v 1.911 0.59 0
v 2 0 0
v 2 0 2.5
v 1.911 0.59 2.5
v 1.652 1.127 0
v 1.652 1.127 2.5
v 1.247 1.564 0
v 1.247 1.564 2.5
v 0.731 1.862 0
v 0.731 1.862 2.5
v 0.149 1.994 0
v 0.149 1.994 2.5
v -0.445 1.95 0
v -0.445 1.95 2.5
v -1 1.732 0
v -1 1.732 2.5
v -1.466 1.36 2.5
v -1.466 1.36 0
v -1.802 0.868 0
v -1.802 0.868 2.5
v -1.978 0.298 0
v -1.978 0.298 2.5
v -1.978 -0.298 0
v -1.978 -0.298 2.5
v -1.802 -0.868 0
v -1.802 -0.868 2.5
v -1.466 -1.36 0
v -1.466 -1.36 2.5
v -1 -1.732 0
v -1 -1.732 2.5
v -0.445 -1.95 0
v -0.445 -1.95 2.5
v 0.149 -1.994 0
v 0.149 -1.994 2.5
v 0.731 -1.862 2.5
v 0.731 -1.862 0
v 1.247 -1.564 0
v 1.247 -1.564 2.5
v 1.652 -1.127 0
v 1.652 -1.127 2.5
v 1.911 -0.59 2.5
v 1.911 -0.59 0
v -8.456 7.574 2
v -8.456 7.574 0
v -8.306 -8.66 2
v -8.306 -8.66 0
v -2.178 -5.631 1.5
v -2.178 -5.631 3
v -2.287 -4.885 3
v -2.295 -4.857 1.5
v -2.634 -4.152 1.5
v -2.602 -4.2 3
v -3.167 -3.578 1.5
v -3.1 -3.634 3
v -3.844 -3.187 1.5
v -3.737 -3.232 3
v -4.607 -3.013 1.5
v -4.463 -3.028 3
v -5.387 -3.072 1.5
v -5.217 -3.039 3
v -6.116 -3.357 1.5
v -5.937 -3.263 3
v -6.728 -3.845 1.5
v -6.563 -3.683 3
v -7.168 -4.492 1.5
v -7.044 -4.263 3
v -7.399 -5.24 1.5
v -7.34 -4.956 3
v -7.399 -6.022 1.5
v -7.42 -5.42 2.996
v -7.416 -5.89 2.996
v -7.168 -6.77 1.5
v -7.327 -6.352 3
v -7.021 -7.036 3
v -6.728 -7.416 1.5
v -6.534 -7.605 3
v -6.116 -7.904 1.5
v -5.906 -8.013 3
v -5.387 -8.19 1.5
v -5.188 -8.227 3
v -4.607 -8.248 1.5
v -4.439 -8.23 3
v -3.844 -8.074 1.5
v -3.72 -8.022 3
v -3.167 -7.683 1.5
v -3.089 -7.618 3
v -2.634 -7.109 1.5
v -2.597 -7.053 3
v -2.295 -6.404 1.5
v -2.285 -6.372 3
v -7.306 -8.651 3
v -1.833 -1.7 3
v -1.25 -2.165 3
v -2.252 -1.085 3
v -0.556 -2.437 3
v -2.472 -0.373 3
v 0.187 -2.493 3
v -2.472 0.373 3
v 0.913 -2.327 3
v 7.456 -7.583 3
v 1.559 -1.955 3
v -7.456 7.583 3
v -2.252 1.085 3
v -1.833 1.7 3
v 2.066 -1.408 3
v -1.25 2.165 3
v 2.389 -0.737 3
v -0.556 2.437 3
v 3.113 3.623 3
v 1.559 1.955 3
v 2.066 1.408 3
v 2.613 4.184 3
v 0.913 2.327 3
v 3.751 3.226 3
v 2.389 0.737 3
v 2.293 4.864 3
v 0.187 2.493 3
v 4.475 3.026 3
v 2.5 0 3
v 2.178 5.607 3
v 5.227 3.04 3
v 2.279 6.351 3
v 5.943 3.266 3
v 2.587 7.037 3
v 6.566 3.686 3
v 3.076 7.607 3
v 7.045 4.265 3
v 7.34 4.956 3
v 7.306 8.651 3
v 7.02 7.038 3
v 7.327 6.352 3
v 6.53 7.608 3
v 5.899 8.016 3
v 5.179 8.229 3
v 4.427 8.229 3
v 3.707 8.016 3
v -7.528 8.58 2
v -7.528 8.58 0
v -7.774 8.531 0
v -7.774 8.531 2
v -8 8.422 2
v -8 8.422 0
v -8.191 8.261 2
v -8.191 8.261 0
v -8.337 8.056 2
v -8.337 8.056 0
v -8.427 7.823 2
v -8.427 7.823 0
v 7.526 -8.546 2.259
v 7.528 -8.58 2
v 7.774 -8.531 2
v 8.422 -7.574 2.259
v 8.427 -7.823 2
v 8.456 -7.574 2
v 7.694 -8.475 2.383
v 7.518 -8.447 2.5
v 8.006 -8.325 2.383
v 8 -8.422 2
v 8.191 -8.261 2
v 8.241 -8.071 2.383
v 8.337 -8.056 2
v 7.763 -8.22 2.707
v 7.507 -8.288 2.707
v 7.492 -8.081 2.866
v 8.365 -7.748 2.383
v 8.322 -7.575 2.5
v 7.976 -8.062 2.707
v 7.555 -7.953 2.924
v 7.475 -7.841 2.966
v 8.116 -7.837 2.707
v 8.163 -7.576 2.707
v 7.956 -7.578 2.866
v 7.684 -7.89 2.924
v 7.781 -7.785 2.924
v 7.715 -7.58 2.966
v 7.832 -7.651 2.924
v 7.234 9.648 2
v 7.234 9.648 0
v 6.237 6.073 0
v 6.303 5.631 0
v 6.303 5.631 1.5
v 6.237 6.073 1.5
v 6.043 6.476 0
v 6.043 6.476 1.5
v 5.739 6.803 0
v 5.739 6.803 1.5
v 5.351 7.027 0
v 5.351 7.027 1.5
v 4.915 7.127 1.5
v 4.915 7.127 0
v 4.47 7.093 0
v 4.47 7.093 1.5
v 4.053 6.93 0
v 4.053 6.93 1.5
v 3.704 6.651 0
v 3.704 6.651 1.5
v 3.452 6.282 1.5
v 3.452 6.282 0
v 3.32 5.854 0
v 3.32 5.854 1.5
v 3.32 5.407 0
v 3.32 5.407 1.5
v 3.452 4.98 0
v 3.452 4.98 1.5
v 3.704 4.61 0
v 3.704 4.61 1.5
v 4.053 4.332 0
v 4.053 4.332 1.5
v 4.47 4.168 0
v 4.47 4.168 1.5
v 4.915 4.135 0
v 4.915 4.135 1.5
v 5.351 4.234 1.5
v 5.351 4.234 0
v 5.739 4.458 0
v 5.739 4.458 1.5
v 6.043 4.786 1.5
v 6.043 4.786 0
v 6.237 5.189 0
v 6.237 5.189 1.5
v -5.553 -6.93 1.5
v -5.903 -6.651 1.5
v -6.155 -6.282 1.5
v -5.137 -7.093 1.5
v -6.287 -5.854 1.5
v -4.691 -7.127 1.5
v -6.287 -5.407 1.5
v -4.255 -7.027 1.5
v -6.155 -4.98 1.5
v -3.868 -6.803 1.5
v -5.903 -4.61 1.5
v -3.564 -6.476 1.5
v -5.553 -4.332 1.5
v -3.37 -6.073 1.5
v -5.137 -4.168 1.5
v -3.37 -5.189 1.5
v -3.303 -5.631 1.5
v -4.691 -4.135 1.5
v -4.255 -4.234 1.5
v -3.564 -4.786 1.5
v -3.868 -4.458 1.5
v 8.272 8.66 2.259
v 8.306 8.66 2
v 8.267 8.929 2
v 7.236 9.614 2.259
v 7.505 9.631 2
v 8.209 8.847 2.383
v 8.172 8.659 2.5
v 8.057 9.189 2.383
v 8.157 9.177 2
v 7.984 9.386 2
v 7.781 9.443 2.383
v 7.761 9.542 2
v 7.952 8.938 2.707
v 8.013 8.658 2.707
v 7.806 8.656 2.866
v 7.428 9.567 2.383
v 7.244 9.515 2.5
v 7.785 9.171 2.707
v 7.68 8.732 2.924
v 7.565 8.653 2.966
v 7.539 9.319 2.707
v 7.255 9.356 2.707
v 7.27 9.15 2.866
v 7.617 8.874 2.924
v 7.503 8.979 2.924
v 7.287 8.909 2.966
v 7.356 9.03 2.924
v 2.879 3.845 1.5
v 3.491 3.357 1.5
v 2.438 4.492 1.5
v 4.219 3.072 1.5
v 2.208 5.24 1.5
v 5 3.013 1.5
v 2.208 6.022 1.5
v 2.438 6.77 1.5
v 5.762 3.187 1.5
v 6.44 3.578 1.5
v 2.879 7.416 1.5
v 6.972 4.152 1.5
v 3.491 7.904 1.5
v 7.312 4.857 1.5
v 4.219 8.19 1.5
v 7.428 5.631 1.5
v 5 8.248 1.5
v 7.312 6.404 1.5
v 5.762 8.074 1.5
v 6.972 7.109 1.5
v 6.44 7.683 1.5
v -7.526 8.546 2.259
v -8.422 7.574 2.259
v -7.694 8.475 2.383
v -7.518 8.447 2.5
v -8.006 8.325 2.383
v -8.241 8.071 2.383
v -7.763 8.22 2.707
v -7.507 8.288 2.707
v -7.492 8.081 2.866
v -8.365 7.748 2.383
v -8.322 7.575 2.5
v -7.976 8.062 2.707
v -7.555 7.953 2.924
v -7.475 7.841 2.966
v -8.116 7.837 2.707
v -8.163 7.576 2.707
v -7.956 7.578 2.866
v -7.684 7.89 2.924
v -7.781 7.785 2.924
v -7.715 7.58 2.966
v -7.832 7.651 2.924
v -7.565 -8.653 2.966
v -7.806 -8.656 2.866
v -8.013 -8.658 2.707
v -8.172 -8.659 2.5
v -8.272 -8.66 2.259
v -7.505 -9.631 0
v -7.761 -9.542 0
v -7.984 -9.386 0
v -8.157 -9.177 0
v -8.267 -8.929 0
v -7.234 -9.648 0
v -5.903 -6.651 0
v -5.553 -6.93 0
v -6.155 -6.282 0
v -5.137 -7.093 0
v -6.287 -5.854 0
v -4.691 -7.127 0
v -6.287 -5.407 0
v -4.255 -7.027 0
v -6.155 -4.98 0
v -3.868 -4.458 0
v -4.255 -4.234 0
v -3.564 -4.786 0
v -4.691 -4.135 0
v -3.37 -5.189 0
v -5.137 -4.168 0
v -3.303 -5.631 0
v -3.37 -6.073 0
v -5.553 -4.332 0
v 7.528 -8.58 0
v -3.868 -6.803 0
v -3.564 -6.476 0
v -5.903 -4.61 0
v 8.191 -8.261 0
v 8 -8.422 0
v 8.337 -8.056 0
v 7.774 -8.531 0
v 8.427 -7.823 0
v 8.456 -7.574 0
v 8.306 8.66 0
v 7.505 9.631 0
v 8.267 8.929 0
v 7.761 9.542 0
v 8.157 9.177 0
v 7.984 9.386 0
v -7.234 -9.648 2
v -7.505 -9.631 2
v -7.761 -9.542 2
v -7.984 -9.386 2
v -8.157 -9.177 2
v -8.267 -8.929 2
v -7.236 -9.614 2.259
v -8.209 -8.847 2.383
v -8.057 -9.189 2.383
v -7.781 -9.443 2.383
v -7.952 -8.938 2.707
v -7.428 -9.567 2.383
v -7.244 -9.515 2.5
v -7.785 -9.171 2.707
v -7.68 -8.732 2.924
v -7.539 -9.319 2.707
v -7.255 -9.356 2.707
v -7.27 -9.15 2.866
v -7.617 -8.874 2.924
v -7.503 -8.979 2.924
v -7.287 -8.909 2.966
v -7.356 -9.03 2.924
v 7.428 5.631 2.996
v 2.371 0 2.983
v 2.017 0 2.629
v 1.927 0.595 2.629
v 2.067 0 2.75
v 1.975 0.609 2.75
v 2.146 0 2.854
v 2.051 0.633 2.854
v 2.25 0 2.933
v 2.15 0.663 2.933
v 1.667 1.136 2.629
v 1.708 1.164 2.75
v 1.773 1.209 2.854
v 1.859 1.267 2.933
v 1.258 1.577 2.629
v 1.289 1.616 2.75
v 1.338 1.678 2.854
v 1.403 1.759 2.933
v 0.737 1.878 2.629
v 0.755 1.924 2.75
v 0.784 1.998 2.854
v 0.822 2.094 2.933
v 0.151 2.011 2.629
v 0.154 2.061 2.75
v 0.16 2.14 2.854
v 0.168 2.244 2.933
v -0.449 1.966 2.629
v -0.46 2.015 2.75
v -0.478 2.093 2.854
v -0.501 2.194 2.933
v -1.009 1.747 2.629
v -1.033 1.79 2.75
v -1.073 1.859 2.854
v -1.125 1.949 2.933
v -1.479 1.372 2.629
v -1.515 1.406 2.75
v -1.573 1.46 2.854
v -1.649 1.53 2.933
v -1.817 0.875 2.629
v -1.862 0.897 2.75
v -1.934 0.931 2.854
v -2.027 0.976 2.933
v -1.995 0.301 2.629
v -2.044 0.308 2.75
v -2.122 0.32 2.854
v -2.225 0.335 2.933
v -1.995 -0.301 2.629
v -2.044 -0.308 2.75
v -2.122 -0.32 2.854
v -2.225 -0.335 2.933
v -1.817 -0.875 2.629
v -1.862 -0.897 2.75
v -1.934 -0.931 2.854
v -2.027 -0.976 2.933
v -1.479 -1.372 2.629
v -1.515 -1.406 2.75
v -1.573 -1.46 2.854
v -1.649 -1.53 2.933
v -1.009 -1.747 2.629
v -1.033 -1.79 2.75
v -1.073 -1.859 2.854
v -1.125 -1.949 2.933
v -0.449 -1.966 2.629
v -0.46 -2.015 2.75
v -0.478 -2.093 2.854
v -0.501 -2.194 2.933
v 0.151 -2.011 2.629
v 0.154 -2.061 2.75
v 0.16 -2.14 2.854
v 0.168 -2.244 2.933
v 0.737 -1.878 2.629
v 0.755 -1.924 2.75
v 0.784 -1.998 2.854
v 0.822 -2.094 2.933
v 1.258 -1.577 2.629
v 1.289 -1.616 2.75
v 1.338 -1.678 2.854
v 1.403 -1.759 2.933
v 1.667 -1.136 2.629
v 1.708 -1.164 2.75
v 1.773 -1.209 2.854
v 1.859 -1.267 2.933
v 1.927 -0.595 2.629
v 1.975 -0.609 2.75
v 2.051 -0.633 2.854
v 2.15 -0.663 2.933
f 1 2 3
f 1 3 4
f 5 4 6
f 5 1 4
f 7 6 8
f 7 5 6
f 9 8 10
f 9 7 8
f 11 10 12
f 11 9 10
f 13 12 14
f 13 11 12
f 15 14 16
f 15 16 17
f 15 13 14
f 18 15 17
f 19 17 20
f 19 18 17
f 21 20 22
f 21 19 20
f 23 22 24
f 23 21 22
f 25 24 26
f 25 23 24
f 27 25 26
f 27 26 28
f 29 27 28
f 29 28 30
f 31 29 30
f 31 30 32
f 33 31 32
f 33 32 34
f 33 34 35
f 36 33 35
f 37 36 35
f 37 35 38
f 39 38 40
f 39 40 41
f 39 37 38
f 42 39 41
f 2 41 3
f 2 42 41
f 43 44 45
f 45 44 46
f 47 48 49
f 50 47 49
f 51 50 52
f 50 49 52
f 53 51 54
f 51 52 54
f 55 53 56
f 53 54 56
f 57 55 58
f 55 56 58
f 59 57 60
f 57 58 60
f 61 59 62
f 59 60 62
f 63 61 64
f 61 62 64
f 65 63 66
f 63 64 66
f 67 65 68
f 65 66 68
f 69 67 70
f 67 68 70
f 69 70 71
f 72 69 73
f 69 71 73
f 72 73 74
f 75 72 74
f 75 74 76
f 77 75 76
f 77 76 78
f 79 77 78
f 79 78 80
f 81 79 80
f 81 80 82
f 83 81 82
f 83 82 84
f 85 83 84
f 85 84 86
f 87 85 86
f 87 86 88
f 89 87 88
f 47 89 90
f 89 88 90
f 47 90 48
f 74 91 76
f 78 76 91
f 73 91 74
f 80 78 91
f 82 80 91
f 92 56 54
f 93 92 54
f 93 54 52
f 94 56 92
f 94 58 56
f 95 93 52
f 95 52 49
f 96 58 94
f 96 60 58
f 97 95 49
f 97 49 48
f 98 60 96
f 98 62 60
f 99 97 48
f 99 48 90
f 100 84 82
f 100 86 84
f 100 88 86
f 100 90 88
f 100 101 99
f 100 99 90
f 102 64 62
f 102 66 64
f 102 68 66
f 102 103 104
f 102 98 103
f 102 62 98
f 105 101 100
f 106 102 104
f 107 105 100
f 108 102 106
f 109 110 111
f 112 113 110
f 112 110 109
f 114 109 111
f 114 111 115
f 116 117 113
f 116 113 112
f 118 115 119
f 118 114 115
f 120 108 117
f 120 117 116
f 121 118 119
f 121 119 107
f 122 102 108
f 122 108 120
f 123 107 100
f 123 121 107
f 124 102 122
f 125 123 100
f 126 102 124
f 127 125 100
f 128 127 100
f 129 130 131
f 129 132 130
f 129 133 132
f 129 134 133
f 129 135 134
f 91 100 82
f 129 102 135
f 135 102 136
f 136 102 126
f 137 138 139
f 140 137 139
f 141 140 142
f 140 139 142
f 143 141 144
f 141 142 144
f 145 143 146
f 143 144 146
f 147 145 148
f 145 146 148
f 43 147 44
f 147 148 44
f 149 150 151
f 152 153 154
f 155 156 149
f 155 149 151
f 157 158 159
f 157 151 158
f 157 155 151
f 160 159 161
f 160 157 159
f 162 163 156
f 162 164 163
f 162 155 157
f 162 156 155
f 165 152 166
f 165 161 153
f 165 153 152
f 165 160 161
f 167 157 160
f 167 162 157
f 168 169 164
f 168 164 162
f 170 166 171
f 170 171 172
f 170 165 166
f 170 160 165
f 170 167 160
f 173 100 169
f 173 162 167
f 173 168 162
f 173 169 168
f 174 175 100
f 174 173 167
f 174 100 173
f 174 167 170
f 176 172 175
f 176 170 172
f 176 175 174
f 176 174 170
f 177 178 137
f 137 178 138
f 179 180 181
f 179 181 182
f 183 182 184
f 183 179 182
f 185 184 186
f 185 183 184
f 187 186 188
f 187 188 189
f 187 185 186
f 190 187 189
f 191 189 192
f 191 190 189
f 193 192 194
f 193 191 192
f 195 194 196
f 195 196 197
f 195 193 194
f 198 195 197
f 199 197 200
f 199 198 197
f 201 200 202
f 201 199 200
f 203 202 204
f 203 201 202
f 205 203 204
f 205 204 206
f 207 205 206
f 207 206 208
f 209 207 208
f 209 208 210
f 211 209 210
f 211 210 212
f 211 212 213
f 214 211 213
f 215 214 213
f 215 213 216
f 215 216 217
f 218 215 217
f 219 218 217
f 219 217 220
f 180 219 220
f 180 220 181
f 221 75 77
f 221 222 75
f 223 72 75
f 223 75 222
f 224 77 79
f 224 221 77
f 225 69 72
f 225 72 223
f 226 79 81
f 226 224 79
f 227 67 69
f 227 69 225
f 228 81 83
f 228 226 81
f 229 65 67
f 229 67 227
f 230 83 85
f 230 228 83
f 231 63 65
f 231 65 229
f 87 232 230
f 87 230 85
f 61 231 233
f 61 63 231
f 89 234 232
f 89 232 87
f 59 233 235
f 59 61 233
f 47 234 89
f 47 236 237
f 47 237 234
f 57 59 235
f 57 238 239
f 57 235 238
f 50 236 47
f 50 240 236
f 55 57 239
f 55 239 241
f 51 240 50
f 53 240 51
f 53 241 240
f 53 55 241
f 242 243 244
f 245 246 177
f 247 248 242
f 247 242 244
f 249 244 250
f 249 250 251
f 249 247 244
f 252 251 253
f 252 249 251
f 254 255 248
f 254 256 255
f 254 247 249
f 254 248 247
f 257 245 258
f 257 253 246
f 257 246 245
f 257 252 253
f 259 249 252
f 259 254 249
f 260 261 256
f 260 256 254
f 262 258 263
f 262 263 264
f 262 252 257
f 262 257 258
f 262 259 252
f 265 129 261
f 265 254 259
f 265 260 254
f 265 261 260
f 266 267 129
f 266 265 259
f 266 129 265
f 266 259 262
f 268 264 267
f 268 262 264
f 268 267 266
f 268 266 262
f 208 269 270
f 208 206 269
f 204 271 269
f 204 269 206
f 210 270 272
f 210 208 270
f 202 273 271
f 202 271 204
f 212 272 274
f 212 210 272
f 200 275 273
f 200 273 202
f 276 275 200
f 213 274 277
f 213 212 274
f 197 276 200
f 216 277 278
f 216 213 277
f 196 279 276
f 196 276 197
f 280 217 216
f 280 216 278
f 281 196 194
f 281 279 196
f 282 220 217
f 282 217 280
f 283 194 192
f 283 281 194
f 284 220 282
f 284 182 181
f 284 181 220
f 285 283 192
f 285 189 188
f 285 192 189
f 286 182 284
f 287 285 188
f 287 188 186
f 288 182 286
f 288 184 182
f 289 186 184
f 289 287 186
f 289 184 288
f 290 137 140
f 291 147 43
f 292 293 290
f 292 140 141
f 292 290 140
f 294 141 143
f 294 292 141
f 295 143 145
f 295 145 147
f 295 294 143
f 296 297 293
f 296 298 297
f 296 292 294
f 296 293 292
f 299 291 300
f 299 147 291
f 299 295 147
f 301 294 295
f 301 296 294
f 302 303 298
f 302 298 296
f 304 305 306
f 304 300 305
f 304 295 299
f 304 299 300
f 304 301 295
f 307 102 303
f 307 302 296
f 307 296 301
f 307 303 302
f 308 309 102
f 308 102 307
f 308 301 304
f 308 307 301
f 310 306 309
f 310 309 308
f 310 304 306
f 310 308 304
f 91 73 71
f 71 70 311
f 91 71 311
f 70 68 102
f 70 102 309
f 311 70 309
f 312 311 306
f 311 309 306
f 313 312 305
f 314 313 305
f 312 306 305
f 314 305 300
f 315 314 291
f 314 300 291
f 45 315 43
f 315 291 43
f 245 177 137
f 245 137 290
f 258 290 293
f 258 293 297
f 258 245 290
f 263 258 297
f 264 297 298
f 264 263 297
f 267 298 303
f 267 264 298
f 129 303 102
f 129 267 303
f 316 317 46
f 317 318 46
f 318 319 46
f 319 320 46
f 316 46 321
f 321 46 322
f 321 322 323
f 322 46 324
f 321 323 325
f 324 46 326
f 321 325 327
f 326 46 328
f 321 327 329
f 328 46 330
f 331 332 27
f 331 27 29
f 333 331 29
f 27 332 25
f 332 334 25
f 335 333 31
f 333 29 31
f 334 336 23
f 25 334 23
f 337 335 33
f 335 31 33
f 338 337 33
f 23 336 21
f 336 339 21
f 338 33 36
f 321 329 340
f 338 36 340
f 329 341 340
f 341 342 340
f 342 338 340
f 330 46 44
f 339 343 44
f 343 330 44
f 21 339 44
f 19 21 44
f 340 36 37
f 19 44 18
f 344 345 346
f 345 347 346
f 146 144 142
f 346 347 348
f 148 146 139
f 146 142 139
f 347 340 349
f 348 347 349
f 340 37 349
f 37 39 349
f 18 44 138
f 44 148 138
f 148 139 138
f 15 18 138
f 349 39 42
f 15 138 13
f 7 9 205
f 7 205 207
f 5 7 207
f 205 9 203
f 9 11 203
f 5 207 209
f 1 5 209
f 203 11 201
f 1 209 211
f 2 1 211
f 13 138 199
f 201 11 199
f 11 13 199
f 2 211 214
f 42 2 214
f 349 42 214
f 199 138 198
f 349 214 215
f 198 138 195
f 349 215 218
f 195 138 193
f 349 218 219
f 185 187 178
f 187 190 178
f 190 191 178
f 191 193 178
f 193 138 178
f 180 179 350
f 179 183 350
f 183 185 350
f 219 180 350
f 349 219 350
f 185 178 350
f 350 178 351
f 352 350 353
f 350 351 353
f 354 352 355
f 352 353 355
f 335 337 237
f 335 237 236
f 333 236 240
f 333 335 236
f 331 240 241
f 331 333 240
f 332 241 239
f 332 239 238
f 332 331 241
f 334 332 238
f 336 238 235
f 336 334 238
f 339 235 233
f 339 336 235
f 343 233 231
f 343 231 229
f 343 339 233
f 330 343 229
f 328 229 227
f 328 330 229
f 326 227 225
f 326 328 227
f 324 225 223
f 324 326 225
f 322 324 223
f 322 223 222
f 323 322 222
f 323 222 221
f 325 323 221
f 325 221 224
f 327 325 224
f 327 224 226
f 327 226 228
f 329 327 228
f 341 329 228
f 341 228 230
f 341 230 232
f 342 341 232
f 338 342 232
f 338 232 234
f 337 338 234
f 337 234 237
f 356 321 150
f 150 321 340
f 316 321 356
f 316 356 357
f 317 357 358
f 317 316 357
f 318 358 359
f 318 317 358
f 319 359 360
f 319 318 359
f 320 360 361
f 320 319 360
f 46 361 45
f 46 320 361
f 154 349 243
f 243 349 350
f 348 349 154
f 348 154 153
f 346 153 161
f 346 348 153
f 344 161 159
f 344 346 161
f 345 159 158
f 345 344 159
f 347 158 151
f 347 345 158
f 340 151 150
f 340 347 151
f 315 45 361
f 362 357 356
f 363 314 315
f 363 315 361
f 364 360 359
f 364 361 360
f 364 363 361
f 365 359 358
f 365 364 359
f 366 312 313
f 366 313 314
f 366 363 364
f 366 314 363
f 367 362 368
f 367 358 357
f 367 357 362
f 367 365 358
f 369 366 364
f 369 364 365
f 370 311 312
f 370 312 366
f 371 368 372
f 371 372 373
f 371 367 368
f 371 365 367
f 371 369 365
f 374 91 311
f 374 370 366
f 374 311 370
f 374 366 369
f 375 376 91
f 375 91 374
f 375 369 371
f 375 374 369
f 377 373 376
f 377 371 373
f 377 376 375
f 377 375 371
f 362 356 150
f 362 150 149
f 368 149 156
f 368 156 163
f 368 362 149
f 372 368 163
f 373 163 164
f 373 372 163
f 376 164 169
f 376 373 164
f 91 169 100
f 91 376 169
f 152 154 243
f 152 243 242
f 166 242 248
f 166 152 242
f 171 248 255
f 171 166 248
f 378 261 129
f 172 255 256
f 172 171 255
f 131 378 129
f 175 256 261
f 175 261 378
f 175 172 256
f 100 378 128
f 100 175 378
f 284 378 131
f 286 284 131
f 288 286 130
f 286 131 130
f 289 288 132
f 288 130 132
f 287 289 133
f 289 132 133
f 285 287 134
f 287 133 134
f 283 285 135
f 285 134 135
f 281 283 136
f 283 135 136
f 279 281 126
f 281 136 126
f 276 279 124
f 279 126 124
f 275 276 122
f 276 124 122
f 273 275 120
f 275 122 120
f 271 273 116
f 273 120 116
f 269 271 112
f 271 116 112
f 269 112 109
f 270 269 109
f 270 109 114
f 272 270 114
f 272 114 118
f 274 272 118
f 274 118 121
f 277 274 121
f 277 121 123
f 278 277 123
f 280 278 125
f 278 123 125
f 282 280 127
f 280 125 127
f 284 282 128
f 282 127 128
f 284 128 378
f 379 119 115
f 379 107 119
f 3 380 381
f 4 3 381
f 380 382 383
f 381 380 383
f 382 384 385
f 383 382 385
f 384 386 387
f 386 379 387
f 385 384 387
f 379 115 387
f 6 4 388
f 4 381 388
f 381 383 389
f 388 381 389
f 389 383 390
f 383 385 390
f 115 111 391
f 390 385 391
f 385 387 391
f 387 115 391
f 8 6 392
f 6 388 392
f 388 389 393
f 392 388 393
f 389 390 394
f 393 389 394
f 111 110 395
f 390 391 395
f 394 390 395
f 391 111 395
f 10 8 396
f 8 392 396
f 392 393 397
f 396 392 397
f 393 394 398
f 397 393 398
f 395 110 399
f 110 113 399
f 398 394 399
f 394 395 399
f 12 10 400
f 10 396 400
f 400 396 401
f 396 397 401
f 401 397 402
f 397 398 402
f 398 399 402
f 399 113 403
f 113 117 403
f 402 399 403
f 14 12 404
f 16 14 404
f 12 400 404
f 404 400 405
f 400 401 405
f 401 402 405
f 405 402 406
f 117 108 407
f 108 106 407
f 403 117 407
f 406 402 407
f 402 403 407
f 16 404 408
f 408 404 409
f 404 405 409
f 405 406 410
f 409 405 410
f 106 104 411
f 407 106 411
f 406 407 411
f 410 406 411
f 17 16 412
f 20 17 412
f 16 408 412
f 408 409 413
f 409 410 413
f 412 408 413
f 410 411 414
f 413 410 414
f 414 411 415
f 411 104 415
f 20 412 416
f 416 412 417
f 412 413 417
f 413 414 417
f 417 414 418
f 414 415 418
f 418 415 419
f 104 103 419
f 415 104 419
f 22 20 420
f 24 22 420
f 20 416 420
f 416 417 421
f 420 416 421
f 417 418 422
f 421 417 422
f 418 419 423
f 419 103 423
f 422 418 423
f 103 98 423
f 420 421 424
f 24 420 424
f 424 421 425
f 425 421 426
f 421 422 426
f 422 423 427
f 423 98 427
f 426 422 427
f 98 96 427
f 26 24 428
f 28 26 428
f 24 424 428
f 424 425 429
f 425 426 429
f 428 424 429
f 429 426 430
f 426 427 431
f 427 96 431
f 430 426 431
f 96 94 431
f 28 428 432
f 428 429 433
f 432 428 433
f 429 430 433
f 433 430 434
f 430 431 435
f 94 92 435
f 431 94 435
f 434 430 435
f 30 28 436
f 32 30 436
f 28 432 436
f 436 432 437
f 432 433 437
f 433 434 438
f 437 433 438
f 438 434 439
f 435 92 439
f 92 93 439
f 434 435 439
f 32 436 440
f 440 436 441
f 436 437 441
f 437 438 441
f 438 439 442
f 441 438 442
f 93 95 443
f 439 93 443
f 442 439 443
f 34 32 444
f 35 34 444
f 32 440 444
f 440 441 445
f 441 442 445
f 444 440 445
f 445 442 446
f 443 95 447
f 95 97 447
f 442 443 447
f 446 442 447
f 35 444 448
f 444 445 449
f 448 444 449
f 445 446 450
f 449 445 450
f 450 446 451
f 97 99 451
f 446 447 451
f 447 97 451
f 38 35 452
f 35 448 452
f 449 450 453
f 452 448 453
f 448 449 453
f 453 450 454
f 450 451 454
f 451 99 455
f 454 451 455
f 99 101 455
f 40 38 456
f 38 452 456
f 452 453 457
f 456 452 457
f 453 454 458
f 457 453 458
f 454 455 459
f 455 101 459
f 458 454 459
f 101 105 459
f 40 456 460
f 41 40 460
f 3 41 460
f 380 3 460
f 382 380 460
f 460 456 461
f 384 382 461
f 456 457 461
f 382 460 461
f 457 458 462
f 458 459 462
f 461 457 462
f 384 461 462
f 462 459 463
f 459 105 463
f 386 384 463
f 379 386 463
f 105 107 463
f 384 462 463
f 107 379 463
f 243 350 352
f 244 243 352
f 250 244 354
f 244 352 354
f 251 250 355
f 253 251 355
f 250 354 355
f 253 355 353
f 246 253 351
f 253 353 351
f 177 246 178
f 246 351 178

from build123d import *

# Parameters (mm, degrees)
F0_R         = 1.5
F0_R_2       = 2
F1_DEPTH     = 3
F2_R         = 2.625
F2_R_2       = 1.5
F3_DEPTH     = 1.5
F4_T1_DEPTH  = 4.3472443006
F4_T3_DEPTH  = 16.2344954865
F4_T5_DEPTH  = 14.8006020278
F4_T7_DEPTH  = 4.6626968477
F4_T9_DEPTH  = 16.2344954865
F4_T11_DEPTH = 14.8006020278
F4_T16_DEPTH = 1
F4_T22_DEPTH = 1
F4_T28_DEPTH = 1
F4_T34_DEPTH = 1
F5_R         = 0.5


# Not quite as in the source:
# - a fillet or chamfer that OpenCascade refuses, or shapes differently, is made with other operations: its cross-section is extruded or revolved along the edge and cut away or added


with BuildPart() as f1:
    # F0 (on Top) → F1 (new body)
    with BuildSketch(Plane.XY):
        Polygon((8.4645454874, -8.5124193832), (8.2962074114, 9.7252756798), (-8.4645454874, 8.5124193832), (-8.2962074114, -9.7252756798), align=None)
        with Locations((-4.8033426305, -5.6307453454)):
            Circle(F0_R, mode=Mode.SUBTRACT)
        Polygon((4.02705255, 0.3354530665), (2.3040371523, -3.3198032774), (-1.7230153977, -3.6552563439), (-4.02705255, -0.3354530665), (-2.3040371523, 3.3198032774), (1.7230153977, 3.6552563439), align=None, mode=Mode.SUBTRACT)
        with Locations((4.8033426305, 5.6307453454)):
            Circle(F0_R, mode=Mode.SUBTRACT)
        Polygon((-1.7230153977, -3.6552563439), (2.3040371523, -3.3198032774), (4.02705255, 0.3354530665), (1.7230153977, 3.6552563439), (-2.3040371523, 3.3198032774), (-4.02705255, -0.3354530665), align=None)
        Circle(F0_R_2, mode=Mode.SUBTRACT)
    extrude(amount=F1_DEPTH)

    # F2 (on face) → F3 (cut)
    with BuildSketch(Plane.XY.offset(3)):
        with Locations((-4.8033426305, -5.6307453454)):
            Circle(F2_R)
        with Locations((-4.8033426305, -5.6307453454)):
            Circle(F2_R_2, mode=Mode.SUBTRACT)
        with Locations((4.8033426305, 5.6307453454)):
            Circle(F2_R)
        with Locations((4.8033426305, 5.6307453454)):
            Circle(F2_R_2, mode=Mode.SUBTRACT)
    extrude(amount=-F3_DEPTH, mode=Mode.SUBTRACT)

    # F4: fillet of radius 1 on 8 edges, made by hand

    # F4_s2 → F4_t1 (cut)
    with BuildSketch(Plane.XY.offset(-2.3472443006)):
        with BuildLine():
            ThreePointArc((-7.5280963703, 8.5801835352), (-8.1912373991, 8.2605167863), (-8.4558796169, 7.573561656))
            Line((-8.4558796169, 7.573561656), (-8.4645454874, 8.5124193832))
            Line((-8.4645454874, 8.5124193832), (-7.5280963703, 8.5801835352))
        make_face()
        with BuildLine():
            ThreePointArc((8.4558796169, -7.573561656), (8.1912373991, -8.2605167863), (7.5280963703, -8.5801835352))
            Line((7.5280963703, -8.5801835352), (8.4645454874, -8.5124193832))
            Line((8.4645454874, -8.5124193832), (8.4558796169, -7.573561656))
        make_face()
    extrude(amount=F4_T1_DEPTH, mode=Mode.SUBTRACT)

    # F4_s4 → F4_t3 (cut)
    with BuildSketch(Plane(origin=(-0.0706200975, 7.6509595097, 0), x_dir=(0, 0, 1), z_dir=(0.0092298344, -0.9999574042, 0))):
        with BuildLine():
            ThreePointArc((3, 7.3856167117), (2.7071067812, 8.0927234929), (2, 8.3856167117))
            Line((2, 8.3856167117), (3, 8.3856167117))
            Line((3, 8.3856167117), (3, 7.3856167117))
        make_face()
    extrude(amount=F4_T3_DEPTH, mode=Mode.SUBTRACT)

    # F4_s6 → F4_t5 (cut)
    with BuildSketch(Plane(origin=(7.8907735218, 0.570999072, 0), x_dir=(0, 0, 1), z_dir=(-0.9973920448, -0.0721741576, 0))):
        with BuildLine():
            ThreePointArc((2, 9.1011408148), (2.7071067812, 8.808247596), (3, 8.1011408148))
            Line((3, 8.1011408148), (3, 9.1011408148))
            Line((3, 9.1011408148), (2, 9.1011408148))
        make_face()
    extrude(amount=F4_T5_DEPTH, mode=Mode.SUBTRACT)

    # F4_s8 → F4_t7 (cut)
    with BuildSketch(Plane.XY.offset(-2.6626968477)):
        with BuildLine():
            ThreePointArc((8.3060379118, 8.6602423087), (7.9838058035, 9.3863276607), (7.23390635, 9.648404519))
            Line((7.23390635, 9.648404519), (8.2962074114, 9.7252756798))
            Line((8.2962074114, 9.7252756798), (8.3060379118, 8.6602423087))
        make_face()
        with BuildLine():
            ThreePointArc((-7.23390635, -9.648404519), (-7.9838058035, -9.3863276607), (-8.3060379118, -8.6602423087))
            Line((-8.3060379118, -8.6602423087), (-8.2962074114, -9.7252756798))
            Line((-8.2962074114, -9.7252756798), (-7.23390635, -9.648404519))
        make_face()
    extrude(amount=F4_T7_DEPTH, mode=Mode.SUBTRACT)

    # F4_s10 → F4_t9 (cut)
    with BuildSketch(Plane(origin=(0.0706200975, -7.6509595097, 0), x_dir=(0, 0, 1), z_dir=(-0.0092298344, 0.9999574042, 0))):
        with BuildLine():
            ThreePointArc((2, 8.3856167117), (2.7071067812, 8.0927234929), (3, 7.3856167117))
            Line((3, 7.3856167117), (3, 8.3856167117))
            Line((3, 8.3856167117), (2, 8.3856167117))
        make_face()
    extrude(amount=F4_T9_DEPTH, mode=Mode.SUBTRACT)

    # F4_s12 → F4_t11 (cut)
    with BuildSketch(Plane(origin=(-7.8907735218, -0.570999072, 0), x_dir=(0, 0, 1), z_dir=(0.9973920448, 0.0721741576, 0))):
        with BuildLine():
            ThreePointArc((2, 9.1011408148), (2.7071067812, 8.808247596), (3, 8.1011408148))
            Line((3, 8.1011408148), (3, 9.1011408148))
            Line((3, 9.1011408148), (2, 9.1011408148))
        make_face()
    extrude(amount=F4_T11_DEPTH, mode=Mode.SUBTRACT)


with BuildPart() as f4_tool14:
    # F4_s15 → F4_t16 (new body)
    with BuildSketch(Plane.XY.offset(2)):
        Polygon((-7.4559222127, 7.5827914904), (-8.4558796169, 7.573561656), (-8.4645454874, 8.5124193832), (-7.5280963703, 8.5801835352), align=None)
    extrude(amount=F4_T16_DEPTH)

    # F4_s17 → F4_t18 (revolve, cut)
    with BuildSketch(Plane(origin=(-7.4559222127, 7.5827914904, 2), x_dir=(0.7353151864, -0.6777252959, 0), z_dir=(-0.6777252959, -0.7353151864, 0))):
        with BuildLine():
            ThreePointArc((0, -1), (1, 0), (0, 1))
            Line((0, 1), (0, -1))
        make_face()
    revolve(axis=Axis((-7.4559222127, 7.5827914904, 2), (0, 0, 1)), mode=Mode.SUBTRACT)


with BuildPart() as f1_1:
    add(f1.part)

    # F4_t13: cut F4_tool14
    add(f4_tool14.part, mode=Mode.SUBTRACT)


with BuildPart() as f4_tool20:
    # F4_s21 → F4_t22 (new body)
    with BuildSketch(Plane.XY.offset(2)):
        Polygon((-7.3060805076, -8.6510124742), (-8.3060379118, -8.6602423087), (-8.2962074114, -9.7252756798), (-7.23390635, -9.648404519), align=None)
    extrude(amount=F4_T22_DEPTH)

    # F4_s23 → F4_t24 (revolve, cut)
    with BuildSketch(Plane(origin=(-7.3060805076, -8.6510124742, 2), x_dir=(0.6777252959, 0.7353151864, 0), z_dir=(0.7353151864, -0.6777252959, 0))):
        with BuildLine():
            ThreePointArc((0, -1), (1, 0), (0, 1))
            Line((0, 1), (0, -1))
        make_face()
    revolve(axis=Axis((-7.3060805076, -8.6510124742, 2), (0, 0, 1)), mode=Mode.SUBTRACT)


with BuildPart() as f1_2:
    add(f1_1.part)

    # F4_t19: cut F4_tool20
    add(f4_tool20.part, mode=Mode.SUBTRACT)


with BuildPart() as f4_tool26:
    # F4_s27 → F4_t28 (new body)
    with BuildSketch(Plane.XY.offset(2)):
        Polygon((7.3060805076, 8.6510124742), (8.3060379118, 8.6602423087), (8.2962074114, 9.7252756798), (7.23390635, 9.648404519), align=None)
    extrude(amount=F4_T28_DEPTH)

    # F4_s29 → F4_t30 (revolve, cut)
    with BuildSketch(Plane(origin=(7.3060805076, 8.6510124742, 2), x_dir=(-0.6777252959, -0.7353151864, 0), z_dir=(-0.7353151864, 0.6777252959, 0))):
        with BuildLine():
            ThreePointArc((0, -1), (1, 0), (0, 1))
            Line((0, 1), (0, -1))
        make_face()
    revolve(axis=Axis((7.3060805076, 8.6510124742, 2), (0, 0, 1)), mode=Mode.SUBTRACT)


with BuildPart() as f1_3:
    add(f1_2.part)

    # F4_t25: cut F4_tool26
    add(f4_tool26.part, mode=Mode.SUBTRACT)


with BuildPart() as f4_tool32:
    # F4_s33 → F4_t34 (new body)
    with BuildSketch(Plane.XY.offset(2)):
        Polygon((7.4559222127, -7.5827914904), (8.4558796169, -7.573561656), (8.4645454874, -8.5124193832), (7.5280963703, -8.5801835352), align=None)
    extrude(amount=F4_T34_DEPTH)

    # F4_s35 → F4_t36 (revolve, cut)
    with BuildSketch(Plane(origin=(7.4559222127, -7.5827914904, 2), x_dir=(-0.7353151864, 0.6777252959, 0), z_dir=(0.6777252959, 0.7353151864, 0))):
        with BuildLine():
            ThreePointArc((0, -1), (1, 0), (0, 1))
            Line((0, 1), (0, -1))
        make_face()
    revolve(axis=Axis((7.4559222127, -7.5827914904, 2), (0, 0, 1)), mode=Mode.SUBTRACT)


with BuildPart() as f1_4:
    add(f1_3.part)

    # F4_t31: cut F4_tool32
    add(f4_tool32.part, mode=Mode.SUBTRACT)

    # F5
    f5_edges = [f1_4.edges().sort_by_distance(p)[0] for p in [
        (-2, 0, 3),
    ]]
    fillet(f5_edges, radius=F5_R)


solid = f1_4.part
